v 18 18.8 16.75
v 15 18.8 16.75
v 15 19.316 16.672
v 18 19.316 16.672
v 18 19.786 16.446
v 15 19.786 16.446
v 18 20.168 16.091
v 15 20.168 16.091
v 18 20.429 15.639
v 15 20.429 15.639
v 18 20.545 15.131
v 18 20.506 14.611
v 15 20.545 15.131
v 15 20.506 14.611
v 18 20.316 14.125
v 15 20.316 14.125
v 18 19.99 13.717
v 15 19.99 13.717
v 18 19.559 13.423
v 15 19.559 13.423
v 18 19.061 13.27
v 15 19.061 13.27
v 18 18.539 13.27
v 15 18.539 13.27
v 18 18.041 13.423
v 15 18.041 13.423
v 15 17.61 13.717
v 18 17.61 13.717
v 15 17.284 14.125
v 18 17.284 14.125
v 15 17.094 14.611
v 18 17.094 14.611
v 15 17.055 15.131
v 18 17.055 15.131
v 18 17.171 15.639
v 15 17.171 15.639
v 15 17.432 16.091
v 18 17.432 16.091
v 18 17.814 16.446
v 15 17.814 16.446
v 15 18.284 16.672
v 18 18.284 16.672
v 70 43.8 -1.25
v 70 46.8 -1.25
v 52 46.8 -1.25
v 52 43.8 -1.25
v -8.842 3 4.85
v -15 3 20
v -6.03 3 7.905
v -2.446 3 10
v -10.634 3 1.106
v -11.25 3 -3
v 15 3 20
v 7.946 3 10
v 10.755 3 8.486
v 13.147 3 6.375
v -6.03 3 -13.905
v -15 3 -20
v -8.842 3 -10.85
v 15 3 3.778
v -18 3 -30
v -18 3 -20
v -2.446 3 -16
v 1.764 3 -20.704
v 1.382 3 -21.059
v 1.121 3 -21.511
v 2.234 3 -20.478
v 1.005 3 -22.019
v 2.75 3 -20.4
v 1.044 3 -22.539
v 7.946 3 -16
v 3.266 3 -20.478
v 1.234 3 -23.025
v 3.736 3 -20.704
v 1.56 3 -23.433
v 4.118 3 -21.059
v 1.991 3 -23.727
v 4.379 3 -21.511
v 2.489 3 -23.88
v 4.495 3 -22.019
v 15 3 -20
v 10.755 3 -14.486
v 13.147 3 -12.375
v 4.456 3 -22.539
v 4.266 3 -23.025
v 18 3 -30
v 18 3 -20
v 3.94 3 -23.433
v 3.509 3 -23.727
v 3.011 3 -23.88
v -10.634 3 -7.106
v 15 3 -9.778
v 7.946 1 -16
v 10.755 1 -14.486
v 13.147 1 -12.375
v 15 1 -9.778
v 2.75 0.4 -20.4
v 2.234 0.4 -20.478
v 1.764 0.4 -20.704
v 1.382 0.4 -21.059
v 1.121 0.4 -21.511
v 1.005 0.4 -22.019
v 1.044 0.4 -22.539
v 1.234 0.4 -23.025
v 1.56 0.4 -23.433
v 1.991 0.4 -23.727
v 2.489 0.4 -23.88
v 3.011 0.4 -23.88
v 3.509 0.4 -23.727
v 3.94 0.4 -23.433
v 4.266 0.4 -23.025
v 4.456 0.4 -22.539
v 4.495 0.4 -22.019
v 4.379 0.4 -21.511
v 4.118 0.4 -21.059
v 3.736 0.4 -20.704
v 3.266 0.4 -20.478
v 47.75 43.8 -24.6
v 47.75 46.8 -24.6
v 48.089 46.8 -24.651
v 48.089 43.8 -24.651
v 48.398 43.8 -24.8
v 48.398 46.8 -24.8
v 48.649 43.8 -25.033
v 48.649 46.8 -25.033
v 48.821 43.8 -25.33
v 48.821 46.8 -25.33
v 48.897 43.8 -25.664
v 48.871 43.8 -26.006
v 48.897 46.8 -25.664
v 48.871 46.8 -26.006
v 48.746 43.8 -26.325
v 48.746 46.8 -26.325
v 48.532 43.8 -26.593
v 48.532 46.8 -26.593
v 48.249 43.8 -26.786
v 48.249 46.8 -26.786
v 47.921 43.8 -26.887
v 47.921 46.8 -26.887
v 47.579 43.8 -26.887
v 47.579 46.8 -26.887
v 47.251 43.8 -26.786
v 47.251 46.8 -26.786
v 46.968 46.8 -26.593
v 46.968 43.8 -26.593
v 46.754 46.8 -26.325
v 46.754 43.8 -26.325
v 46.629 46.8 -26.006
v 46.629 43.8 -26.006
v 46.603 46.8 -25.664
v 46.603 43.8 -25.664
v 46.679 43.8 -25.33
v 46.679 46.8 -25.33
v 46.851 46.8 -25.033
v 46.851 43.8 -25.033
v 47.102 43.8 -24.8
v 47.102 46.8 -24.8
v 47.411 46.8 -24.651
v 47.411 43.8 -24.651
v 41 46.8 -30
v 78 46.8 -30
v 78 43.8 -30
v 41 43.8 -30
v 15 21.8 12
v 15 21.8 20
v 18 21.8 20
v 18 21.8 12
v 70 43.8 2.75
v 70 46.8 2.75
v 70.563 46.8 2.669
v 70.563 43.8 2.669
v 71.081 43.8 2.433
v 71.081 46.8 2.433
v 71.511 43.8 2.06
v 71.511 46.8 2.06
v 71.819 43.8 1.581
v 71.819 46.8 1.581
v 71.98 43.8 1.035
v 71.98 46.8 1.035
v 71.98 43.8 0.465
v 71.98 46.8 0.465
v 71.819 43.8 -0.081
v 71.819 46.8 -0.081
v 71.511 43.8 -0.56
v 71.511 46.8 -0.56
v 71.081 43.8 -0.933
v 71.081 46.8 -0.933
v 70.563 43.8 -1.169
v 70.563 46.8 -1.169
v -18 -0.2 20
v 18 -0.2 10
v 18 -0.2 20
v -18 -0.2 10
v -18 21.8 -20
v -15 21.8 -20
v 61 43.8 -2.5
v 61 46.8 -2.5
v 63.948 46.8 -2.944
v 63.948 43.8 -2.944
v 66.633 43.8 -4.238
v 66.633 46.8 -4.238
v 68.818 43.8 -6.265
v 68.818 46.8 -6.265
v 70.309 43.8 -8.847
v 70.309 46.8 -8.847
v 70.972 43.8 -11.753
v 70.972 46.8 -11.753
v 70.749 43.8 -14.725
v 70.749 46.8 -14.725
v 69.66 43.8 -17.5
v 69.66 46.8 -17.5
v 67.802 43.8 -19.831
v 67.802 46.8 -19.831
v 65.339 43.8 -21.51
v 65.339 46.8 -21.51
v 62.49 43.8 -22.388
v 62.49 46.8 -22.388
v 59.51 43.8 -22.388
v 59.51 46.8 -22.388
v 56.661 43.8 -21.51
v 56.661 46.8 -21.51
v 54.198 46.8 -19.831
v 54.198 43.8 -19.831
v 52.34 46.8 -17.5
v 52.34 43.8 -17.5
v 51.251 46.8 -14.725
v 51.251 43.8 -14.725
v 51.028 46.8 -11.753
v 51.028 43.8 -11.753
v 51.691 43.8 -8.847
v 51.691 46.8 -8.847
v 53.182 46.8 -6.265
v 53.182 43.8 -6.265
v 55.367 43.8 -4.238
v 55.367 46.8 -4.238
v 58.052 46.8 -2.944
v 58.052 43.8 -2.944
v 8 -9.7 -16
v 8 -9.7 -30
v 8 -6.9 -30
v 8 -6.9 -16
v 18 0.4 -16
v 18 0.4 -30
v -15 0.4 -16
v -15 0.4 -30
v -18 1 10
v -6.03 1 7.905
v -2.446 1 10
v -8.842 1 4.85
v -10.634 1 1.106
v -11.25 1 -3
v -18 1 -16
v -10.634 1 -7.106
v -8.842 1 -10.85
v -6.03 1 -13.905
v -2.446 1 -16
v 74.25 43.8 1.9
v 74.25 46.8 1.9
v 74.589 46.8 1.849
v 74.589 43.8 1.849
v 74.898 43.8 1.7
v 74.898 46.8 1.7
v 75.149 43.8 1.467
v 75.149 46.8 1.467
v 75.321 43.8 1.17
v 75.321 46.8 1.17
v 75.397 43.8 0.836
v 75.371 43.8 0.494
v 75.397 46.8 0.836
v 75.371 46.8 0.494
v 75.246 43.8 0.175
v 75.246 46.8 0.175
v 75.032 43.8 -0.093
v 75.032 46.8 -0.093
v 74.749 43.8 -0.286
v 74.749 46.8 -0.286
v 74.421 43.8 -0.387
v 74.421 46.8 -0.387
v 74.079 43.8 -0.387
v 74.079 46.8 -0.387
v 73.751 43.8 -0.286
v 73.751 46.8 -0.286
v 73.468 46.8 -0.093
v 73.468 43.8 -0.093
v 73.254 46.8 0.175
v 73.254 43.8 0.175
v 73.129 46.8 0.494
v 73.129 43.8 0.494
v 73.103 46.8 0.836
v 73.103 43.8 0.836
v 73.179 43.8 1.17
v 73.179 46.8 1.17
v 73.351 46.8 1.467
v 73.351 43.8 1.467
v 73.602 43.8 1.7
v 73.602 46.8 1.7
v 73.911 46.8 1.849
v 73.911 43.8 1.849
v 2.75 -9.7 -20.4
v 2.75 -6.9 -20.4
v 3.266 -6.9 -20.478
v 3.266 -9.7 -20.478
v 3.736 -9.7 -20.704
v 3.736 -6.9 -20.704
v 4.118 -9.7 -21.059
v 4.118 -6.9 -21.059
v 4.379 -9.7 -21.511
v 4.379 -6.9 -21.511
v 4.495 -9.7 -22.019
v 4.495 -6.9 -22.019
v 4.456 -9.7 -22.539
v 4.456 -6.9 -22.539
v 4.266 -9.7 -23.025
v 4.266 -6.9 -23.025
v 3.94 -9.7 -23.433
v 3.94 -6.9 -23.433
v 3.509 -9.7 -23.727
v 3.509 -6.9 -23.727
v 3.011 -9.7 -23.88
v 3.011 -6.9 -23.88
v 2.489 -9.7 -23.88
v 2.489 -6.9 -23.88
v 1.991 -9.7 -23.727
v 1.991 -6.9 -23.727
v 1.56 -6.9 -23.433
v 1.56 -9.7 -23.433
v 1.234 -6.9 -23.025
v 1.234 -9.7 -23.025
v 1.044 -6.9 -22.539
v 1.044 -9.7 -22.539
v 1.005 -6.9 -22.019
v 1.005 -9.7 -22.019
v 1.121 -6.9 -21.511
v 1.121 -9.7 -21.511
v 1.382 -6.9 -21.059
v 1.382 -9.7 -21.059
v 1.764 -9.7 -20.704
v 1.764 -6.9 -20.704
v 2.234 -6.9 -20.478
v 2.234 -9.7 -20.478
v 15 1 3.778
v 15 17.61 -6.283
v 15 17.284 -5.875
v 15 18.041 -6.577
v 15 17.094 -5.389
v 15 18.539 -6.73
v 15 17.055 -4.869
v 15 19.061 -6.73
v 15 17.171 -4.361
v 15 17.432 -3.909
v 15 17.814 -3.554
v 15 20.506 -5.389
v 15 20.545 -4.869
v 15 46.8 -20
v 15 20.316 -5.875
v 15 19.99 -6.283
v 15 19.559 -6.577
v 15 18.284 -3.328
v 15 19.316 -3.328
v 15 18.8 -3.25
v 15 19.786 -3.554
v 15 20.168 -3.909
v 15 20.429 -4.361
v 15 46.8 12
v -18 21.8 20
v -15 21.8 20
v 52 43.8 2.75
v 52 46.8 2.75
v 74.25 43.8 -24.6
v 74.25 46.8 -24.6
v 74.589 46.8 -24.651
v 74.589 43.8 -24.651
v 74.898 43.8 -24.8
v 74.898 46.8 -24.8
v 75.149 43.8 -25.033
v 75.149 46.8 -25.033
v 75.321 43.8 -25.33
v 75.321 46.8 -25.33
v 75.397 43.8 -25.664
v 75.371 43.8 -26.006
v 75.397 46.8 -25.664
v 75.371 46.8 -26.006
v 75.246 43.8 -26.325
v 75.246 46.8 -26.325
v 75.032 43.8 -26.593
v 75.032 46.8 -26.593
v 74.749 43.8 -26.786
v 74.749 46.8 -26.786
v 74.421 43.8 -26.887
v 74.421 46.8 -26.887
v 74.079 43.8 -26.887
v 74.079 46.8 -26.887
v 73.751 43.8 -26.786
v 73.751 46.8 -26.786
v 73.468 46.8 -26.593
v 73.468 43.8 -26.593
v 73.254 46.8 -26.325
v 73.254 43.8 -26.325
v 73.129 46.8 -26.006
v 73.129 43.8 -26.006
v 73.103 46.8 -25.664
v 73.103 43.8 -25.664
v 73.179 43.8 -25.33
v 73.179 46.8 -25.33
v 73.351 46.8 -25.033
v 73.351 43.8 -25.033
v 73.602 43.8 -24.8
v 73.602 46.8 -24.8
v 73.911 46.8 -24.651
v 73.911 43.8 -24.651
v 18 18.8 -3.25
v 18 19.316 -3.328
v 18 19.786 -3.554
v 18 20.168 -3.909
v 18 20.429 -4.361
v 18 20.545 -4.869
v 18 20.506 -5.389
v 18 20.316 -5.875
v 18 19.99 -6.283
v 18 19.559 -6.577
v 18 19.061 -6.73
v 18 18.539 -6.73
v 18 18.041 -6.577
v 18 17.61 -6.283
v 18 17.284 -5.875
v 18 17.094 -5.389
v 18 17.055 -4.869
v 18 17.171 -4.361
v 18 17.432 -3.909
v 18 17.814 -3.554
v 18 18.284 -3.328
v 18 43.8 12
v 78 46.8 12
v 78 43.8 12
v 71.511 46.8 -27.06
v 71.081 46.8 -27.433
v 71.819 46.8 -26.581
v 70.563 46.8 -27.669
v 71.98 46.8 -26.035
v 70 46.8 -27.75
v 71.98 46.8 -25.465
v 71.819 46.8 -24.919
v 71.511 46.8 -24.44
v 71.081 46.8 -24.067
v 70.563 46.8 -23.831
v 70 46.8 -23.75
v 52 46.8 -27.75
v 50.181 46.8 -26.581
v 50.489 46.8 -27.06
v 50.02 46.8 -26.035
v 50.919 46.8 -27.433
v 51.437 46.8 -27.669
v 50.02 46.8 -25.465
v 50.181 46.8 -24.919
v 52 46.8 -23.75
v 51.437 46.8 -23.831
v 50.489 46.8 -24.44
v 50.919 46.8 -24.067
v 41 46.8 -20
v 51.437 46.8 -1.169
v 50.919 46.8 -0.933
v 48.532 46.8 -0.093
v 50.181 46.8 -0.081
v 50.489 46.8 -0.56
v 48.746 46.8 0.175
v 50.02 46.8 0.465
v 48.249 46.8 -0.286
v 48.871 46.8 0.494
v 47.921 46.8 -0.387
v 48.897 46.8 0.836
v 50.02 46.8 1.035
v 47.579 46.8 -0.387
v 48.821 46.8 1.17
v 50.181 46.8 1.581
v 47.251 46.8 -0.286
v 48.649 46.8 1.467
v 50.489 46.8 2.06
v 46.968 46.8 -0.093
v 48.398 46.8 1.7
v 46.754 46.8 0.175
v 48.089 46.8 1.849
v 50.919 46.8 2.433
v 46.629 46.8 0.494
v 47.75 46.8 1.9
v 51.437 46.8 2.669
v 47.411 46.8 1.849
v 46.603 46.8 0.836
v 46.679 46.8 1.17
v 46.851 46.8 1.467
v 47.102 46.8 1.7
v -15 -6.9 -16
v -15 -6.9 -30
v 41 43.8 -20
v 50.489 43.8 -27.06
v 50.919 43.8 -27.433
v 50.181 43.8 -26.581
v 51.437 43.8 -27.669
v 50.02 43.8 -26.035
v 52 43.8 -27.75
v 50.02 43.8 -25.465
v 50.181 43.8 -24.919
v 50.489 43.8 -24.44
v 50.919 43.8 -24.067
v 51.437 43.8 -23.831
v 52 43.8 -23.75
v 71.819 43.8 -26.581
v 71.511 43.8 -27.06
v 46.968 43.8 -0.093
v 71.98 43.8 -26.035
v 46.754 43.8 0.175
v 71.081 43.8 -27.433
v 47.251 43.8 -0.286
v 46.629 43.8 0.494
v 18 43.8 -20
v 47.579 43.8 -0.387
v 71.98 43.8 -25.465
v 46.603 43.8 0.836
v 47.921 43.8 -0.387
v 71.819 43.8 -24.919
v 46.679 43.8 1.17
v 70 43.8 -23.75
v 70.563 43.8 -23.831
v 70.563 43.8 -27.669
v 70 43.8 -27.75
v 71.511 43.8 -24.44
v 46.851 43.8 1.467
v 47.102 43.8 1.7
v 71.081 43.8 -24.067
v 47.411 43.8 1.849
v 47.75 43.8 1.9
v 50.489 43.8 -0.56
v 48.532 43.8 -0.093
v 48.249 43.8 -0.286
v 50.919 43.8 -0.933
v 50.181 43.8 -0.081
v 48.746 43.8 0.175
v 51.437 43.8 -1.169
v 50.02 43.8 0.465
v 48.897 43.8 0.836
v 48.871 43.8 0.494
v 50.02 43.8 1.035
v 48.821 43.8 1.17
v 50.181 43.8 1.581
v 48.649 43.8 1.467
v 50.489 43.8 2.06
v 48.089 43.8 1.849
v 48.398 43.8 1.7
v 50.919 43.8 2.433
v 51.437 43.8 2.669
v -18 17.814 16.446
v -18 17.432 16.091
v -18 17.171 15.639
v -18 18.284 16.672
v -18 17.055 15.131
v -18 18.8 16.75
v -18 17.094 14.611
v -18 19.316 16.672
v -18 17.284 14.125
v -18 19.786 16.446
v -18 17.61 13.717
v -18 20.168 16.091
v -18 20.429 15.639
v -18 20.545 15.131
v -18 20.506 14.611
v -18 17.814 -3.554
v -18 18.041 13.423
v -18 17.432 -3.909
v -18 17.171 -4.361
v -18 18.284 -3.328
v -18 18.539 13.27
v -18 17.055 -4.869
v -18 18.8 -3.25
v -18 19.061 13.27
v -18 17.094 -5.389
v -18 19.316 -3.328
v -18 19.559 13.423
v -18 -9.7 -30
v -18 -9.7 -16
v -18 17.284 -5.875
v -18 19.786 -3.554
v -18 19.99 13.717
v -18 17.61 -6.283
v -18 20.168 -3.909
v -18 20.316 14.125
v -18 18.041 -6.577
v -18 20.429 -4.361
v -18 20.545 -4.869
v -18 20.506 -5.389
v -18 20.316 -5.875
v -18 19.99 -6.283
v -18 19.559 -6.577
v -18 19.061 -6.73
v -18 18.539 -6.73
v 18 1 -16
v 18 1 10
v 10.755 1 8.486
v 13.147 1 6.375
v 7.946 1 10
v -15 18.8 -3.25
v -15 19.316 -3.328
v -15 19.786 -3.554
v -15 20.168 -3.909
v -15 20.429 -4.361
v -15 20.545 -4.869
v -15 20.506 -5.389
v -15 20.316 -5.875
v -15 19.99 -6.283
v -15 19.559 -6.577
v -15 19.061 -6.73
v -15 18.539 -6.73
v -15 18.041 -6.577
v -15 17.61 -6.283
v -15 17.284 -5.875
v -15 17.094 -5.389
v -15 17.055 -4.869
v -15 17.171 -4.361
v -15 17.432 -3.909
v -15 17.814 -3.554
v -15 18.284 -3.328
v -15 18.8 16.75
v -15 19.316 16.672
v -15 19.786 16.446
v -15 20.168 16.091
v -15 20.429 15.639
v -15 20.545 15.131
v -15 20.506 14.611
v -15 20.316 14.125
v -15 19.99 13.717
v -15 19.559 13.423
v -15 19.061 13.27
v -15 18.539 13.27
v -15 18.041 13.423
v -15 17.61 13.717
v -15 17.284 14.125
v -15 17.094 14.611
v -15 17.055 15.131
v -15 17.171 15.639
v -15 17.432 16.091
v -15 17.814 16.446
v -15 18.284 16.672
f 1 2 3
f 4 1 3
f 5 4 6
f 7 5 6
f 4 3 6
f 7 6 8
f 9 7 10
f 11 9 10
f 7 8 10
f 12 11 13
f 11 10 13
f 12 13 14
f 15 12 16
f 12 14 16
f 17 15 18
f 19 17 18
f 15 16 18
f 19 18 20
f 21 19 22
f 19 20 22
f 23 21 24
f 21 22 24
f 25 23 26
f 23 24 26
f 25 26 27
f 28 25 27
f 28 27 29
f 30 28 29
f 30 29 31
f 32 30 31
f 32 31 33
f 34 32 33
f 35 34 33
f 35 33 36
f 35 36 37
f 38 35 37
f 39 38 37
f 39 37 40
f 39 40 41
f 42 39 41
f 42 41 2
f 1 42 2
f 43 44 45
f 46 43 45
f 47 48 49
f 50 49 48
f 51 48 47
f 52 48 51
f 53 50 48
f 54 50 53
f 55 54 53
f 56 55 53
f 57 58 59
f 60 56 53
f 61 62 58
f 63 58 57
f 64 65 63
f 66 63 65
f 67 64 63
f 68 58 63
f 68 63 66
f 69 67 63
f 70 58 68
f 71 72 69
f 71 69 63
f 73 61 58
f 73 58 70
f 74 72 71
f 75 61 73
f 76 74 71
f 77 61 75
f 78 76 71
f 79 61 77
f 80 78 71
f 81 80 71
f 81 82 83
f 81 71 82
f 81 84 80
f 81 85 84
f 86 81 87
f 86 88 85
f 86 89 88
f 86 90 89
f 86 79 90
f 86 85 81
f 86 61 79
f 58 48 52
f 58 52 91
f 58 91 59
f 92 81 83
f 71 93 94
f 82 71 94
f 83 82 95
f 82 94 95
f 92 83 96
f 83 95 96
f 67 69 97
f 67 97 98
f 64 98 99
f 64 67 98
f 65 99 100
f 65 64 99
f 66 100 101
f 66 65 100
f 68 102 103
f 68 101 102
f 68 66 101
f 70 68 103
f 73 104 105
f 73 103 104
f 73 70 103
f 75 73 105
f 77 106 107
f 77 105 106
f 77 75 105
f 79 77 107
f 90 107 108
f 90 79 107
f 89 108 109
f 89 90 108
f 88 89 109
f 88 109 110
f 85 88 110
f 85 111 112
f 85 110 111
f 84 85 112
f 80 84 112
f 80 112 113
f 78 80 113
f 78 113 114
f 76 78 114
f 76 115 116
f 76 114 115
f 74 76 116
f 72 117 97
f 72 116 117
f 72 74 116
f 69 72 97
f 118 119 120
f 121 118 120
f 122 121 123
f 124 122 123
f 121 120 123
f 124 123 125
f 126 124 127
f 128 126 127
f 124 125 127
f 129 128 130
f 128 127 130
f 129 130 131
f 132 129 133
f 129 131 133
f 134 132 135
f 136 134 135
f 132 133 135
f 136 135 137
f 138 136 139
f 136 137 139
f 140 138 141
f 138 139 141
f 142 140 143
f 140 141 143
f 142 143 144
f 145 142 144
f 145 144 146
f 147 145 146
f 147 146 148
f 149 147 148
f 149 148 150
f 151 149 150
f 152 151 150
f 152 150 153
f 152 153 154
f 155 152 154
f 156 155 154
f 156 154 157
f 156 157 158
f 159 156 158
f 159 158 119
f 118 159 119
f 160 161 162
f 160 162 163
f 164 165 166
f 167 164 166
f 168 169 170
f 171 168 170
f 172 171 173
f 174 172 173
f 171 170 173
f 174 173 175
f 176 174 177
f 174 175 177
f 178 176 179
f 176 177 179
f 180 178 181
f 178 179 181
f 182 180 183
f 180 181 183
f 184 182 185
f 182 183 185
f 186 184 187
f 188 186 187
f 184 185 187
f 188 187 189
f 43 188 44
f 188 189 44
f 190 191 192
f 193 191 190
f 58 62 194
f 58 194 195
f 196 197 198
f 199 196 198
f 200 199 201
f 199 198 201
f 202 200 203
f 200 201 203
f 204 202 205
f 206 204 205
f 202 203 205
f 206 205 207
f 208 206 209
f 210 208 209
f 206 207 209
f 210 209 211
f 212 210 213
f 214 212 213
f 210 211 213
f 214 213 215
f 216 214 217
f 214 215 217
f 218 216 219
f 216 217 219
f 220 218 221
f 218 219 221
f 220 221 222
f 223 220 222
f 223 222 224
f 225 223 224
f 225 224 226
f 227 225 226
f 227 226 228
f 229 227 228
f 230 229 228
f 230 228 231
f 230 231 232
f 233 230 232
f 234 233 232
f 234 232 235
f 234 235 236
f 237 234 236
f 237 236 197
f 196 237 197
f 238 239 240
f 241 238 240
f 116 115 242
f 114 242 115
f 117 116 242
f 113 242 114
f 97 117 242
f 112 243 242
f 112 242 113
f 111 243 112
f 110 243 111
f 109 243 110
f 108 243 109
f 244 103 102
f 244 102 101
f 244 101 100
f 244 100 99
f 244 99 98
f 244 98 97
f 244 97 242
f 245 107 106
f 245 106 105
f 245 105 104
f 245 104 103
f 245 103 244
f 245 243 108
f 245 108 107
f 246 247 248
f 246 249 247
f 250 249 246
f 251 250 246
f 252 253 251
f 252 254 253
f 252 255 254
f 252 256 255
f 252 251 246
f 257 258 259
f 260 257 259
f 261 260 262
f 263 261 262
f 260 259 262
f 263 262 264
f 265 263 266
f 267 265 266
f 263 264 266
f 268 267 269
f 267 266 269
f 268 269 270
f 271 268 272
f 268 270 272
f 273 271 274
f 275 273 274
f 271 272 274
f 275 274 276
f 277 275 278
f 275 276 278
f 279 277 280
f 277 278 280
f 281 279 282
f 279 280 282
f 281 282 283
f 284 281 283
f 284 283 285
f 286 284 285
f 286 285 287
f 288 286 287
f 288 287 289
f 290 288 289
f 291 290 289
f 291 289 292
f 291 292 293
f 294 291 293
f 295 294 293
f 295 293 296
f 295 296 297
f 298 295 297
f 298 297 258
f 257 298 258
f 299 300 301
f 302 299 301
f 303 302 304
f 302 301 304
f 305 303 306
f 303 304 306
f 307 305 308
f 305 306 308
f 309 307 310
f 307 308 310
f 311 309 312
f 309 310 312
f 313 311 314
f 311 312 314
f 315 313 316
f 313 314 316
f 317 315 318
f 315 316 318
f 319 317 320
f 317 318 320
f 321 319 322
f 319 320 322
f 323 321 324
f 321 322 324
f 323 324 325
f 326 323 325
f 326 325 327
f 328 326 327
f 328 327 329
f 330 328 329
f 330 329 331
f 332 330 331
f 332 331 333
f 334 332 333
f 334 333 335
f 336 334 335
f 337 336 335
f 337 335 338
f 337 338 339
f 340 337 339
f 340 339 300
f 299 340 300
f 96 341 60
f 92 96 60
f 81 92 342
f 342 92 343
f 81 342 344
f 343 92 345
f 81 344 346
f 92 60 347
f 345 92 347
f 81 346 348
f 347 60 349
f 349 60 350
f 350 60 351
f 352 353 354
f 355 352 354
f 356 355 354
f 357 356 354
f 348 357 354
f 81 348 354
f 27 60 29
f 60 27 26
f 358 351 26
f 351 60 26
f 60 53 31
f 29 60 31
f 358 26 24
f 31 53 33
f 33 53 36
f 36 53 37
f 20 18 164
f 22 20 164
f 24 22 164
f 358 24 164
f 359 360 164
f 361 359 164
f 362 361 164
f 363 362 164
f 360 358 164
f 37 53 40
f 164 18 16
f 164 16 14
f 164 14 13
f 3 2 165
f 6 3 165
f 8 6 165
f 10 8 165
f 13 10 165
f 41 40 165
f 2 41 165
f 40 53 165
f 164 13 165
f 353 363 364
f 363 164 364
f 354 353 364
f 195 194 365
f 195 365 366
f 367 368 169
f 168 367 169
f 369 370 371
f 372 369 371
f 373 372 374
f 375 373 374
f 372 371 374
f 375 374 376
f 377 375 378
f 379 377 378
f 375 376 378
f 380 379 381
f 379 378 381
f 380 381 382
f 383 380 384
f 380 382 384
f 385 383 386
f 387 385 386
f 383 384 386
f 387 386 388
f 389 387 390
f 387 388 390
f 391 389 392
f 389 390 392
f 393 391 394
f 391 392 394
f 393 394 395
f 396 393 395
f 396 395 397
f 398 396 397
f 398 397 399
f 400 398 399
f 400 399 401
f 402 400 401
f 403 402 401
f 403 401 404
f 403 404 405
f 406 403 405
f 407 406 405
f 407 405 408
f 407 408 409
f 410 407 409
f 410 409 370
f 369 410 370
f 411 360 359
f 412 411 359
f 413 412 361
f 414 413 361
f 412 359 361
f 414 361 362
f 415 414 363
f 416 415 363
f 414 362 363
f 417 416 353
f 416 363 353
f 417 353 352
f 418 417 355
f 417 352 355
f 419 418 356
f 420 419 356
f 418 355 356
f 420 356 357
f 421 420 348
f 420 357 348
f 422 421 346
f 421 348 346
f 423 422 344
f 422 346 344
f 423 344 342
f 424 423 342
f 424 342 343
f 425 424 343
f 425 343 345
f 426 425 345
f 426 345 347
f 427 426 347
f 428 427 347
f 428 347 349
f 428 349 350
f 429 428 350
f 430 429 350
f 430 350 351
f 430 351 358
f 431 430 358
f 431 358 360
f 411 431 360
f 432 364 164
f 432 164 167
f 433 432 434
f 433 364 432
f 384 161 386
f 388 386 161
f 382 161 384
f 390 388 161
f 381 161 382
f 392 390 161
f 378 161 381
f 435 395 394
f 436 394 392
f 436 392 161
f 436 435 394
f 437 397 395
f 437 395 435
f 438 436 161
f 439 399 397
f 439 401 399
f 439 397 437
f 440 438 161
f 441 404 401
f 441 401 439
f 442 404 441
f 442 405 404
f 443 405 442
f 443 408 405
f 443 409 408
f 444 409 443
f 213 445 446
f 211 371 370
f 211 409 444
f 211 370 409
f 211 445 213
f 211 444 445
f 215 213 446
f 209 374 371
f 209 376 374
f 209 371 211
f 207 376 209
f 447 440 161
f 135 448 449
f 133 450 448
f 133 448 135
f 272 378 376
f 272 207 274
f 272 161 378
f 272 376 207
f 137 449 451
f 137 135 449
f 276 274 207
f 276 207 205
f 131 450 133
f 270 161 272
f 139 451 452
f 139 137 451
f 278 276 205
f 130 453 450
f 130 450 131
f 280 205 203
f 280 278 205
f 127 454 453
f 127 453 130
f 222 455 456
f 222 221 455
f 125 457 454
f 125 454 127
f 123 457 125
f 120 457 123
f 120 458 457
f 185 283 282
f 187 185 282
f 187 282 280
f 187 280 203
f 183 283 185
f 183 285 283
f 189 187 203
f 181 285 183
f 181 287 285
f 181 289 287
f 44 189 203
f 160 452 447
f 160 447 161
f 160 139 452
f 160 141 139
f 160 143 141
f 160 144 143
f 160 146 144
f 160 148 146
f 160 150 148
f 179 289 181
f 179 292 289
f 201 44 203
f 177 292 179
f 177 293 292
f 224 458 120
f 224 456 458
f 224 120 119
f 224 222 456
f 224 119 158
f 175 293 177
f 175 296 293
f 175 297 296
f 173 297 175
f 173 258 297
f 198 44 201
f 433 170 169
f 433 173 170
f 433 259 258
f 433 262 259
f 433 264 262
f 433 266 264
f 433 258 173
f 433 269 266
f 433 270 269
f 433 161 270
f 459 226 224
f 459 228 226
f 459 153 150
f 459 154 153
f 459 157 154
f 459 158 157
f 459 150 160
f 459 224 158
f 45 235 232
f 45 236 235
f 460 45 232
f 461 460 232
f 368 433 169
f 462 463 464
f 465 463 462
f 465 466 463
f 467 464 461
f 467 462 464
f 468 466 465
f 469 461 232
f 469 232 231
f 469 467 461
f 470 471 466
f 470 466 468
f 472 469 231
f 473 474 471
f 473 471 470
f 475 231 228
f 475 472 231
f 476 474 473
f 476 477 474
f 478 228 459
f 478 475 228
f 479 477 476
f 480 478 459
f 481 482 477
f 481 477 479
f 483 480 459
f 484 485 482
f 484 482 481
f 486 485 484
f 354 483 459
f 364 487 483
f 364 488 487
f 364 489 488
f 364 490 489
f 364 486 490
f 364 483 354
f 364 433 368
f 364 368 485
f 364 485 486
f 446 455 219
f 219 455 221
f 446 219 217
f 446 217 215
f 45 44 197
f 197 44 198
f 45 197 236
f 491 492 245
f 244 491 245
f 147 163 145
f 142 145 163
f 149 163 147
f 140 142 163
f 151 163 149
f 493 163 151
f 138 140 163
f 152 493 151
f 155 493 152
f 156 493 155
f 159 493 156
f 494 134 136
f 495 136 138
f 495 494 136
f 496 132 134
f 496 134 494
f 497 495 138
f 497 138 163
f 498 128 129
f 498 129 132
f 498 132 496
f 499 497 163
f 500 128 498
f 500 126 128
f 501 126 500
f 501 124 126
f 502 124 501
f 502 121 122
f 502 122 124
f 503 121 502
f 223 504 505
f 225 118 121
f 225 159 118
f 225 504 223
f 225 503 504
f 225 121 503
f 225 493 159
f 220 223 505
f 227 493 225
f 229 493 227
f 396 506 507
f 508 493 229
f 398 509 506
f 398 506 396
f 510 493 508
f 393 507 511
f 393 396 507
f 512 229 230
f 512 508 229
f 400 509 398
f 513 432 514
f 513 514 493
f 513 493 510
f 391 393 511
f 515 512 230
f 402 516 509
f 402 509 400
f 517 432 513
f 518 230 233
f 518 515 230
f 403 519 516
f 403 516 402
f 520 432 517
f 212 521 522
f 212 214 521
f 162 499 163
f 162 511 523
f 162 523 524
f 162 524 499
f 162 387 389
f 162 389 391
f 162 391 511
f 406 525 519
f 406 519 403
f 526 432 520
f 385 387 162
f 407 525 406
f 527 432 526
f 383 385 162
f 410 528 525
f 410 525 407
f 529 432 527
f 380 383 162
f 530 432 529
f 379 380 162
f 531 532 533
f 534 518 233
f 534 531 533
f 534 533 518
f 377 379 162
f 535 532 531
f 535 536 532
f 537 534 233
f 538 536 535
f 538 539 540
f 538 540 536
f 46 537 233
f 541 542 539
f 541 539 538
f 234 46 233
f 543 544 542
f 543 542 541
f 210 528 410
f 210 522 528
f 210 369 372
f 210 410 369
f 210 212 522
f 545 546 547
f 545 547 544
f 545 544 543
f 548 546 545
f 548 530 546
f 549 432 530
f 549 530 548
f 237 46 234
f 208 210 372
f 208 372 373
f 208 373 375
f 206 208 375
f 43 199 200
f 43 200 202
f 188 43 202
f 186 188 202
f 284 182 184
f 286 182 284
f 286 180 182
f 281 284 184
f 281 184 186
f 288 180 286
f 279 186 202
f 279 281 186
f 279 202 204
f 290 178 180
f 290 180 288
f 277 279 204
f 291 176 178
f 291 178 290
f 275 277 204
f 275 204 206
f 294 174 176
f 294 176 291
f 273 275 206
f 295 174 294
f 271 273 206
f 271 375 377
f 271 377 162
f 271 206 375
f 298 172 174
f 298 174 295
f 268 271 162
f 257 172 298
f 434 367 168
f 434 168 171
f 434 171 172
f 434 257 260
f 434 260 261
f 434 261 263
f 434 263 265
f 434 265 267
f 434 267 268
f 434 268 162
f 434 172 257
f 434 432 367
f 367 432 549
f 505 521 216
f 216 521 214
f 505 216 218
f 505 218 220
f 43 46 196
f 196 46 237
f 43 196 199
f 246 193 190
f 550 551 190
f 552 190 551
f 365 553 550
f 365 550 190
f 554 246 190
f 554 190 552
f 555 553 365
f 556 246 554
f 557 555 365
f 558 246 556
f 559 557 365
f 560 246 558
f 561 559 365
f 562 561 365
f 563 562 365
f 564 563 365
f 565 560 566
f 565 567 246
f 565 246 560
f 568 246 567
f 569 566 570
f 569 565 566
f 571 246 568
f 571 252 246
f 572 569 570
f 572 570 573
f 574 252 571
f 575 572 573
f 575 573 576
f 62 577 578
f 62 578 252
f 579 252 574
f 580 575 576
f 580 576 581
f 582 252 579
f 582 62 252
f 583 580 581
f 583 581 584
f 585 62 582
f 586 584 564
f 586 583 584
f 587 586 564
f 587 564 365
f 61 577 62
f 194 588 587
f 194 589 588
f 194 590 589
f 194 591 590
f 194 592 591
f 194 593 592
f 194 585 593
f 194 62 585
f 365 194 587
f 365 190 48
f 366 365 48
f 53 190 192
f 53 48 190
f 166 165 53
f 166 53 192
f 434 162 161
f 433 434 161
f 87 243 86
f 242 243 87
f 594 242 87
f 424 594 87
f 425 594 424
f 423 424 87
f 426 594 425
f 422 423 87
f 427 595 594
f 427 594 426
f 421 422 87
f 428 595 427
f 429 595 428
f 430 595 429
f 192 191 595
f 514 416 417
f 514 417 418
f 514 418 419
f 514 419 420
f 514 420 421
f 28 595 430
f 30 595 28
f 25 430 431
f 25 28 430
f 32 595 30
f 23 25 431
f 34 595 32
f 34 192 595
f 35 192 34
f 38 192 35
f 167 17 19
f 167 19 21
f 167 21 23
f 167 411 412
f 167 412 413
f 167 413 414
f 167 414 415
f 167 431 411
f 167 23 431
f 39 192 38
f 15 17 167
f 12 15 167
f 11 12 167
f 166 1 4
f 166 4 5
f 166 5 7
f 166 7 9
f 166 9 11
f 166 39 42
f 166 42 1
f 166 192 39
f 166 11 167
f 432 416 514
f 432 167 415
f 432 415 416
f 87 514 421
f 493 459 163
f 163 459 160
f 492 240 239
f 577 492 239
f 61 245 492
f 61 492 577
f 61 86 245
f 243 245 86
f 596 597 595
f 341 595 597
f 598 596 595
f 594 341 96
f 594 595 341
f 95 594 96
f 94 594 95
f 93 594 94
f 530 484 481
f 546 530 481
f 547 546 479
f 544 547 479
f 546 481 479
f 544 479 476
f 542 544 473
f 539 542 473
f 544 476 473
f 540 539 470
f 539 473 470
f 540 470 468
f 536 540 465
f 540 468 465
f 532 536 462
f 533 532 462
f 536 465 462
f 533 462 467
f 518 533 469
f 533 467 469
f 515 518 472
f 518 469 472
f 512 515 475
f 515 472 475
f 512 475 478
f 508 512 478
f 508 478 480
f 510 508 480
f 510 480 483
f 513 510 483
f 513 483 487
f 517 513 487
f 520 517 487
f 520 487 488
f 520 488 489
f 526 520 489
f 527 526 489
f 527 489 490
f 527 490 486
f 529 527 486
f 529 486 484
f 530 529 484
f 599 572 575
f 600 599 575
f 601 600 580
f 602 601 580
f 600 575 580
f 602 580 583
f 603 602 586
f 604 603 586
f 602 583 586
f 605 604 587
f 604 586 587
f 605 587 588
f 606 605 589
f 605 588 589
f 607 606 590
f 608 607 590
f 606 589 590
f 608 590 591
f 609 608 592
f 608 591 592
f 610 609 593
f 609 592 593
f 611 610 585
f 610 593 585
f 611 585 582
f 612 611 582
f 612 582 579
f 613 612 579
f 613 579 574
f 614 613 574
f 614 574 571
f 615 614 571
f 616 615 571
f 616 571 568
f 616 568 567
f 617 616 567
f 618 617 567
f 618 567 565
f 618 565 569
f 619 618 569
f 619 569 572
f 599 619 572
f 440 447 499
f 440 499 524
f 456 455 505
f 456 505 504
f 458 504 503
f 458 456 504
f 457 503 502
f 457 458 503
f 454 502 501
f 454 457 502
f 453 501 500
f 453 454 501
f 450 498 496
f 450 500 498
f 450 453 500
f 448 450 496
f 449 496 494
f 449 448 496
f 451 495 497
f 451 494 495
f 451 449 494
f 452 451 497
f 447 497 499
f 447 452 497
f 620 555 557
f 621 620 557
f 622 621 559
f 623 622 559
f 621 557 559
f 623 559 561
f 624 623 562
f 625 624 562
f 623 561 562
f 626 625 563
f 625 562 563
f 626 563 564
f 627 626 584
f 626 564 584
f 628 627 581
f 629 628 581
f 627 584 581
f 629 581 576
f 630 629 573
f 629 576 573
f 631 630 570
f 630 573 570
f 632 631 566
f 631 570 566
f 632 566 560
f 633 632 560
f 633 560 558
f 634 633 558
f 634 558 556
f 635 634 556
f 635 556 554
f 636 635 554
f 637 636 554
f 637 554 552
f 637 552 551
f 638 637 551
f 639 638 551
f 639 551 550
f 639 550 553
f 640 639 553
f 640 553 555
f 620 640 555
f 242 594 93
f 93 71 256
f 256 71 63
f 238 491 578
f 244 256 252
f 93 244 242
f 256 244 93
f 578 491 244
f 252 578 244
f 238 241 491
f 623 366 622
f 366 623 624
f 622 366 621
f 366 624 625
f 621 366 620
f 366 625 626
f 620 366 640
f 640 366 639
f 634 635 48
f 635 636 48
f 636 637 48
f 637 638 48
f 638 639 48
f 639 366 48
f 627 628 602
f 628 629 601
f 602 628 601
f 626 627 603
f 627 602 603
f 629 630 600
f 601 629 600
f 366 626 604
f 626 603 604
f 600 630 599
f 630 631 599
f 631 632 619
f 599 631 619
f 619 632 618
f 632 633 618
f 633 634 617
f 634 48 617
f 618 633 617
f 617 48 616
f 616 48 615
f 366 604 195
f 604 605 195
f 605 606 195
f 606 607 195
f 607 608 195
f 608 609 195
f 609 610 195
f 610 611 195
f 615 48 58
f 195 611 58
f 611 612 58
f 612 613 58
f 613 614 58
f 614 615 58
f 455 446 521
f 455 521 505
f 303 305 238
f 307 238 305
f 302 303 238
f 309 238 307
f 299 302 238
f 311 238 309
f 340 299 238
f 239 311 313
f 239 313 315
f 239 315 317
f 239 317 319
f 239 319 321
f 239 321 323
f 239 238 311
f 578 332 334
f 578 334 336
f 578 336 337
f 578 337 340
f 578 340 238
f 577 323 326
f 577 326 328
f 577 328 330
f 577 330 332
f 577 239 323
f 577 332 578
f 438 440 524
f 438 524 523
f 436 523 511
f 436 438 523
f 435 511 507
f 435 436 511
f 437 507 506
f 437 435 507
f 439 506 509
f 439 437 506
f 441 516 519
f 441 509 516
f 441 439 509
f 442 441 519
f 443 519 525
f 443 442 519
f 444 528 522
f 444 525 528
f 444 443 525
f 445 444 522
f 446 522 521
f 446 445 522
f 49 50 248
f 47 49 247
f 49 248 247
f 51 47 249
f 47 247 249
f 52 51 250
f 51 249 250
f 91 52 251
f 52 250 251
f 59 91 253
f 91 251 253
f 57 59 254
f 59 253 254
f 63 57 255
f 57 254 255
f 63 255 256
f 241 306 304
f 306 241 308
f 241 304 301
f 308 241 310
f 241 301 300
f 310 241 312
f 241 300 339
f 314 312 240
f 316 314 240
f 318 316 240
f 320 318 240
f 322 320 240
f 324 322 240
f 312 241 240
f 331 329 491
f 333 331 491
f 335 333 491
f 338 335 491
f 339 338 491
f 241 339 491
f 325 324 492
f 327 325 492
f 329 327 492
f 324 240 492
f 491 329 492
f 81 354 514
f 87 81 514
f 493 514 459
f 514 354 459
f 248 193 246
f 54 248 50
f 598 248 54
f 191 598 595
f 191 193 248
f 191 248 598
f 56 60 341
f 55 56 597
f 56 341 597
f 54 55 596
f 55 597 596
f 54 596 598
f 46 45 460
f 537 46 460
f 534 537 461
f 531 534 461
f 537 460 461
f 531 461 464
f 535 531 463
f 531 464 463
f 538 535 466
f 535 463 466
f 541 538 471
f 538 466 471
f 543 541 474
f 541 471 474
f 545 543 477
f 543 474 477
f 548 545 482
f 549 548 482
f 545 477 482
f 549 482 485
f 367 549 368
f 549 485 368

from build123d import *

# Parameters (mm, degrees)
SKETCH_1_W            = 36
SKETCH_1_H            = 40
EXTRUDE_1_DEPTH       = 3
SKETCH_2_W            = 3
SKETCH_2_H            = 40
EXTRUDE_2_DEPTH       = 18.8
SKETCH_3_R            = 14
CUT_EXTRUDE_1_DEPTH   = 9
SKETCH_4_W            = 36
SKETCH_4_H            = 3
EXTRUDE_3_DEPTH       = 10
SKETCH_6_R            = 2.7
CUT_EXTRUDE_3_DEPTH   = 10
SKETCH_7_R            = 1.75
CUT_EXTRUDE_4_DEPTH   = 52.68404009
SKETCH_9_W            = 25
SKETCH_9_H            = 3
SKETCH_9_W_2          = 3
SKETCH_9_H_2          = 9.3
EXTRUDE_4_DEPTH       = 20
CHAMFER_1_SIZE        = 5
CUT_EXTRUDE_START     = -30
SKETCH_10_R           = 2.7
CUT_EXTRUDE_5_DEPTH   = 30
SKETCH_11_W           = 40.05397725
SKETCH_11_H           = 18.071111192
CUT_EXTRUDE_6_DEPTH   = 52.68404009
EXTRUDE_START         = 2.5
SKETCH_12_W           = 36
SKETCH_12_H           = 20
SKETCH_12_R           = 2.7
EXTRUDE_5_DEPTH       = 2.5
SKETCH_13_W           = 62.12277329
SKETCH_13_H           = 35.561448302
CUT_EXTRUDE_7_DEPTH   = 1
SKETCH_16_W           = 60
SKETCH_16_H           = 3
SKETCH_16_W_2         = 3
SKETCH_16_H_2         = 25
EXTRUDE_7_DEPTH       = 65
EXTRUDE_START_2       = 8
EXTRUDE_8_DEPTH       = 8
SKETCH_18_R           = 1.15
SKETCH_18_R_2         = 10
CUT_EXTRUDE_8_DEPTH   = 15
SKETCH_19_W           = 125.229267156
SKETCH_19_H           = 103.922898786
CUT_EXTRUDE_9_DEPTH   = 0.5
SKETCH_20_W           = 154.797288569
SKETCH_20_H           = 90.443359613
CUT_EXTRUDE_10_DEPTH  = 1.8
SKETCH_21_W           = 11.155684717
SKETCH_21_H           = 2.603751016
EXTRUDE_9_DEPTH       = 3
EXTRUDE_10_DEPTH      = 10
EXTRUDE_10_DEPTH_BACK = 4
SKETCH_22_W           = 36
SKETCH_22_H           = 3.2
SKETCH_23_R           = 1.75
CUT_EXTRUDE_12_DEPTH  = 10
SKETCH_26_W           = 12.845915964
SKETCH_26_H           = 7.377373426
EXTRUDE_11_DEPTH      = 3.2
SKETCH_27_W           = 116.42408431
SKETCH_27_H           = 62.505927617
CUT_EXTRUDE_13_DEPTH  = 10
SKETCH_29_W           = 89.791123847
SKETCH_29_H           = 12.28472202
SKETCH_29_W_2         = 107.401489541
SKETCH_29_H_2         = 29.785433334
CUT_EXTRUDE_14_DEPTH  = 25
SKETCH_30_W           = 3
SKETCH_30_H           = 18.8
EXTRUDE_12_DEPTH      = 17
SKETCH_31_W           = 80.768529078
SKETCH_31_H           = 45.765209612
CUT_EXTRUDE_15_DEPTH  = 0.6
SKETCH_32_W           = 23
SKETCH_32_H           = 2.8
SKETCH_32_W_2         = 3
SKETCH_32_H_2         = 9.9
EXTRUDE_13_DEPTH      = 14
SKETCH_34_R           = 1.75
CUT_EXTRUDE_17_DEPTH  = 97.806198149
SKETCH_35_W           = 168.711651586
SKETCH_35_H           = 128.925269833
CUT_EXTRUDE_18_DEPTH  = 7
SKETCH_36_W           = 30.780953922
SKETCH_36_H           = 20.383466973
CUT_EXTRUDE_19_DEPTH  = 43.8


with BuildPart() as part:
    # 草图1 → 凸台-拉伸1 (new body)
    with BuildSketch(Plane(origin=(0, 0, 0), x_dir=(1, 0, 0), z_dir=(0, 1, 0))):
        Rectangle(SKETCH_1_W, SKETCH_1_H)
    extrude(amount=EXTRUDE_1_DEPTH)

    # 草图2 → 凸台-拉伸2 (add)
    with BuildSketch(Plane(origin=(0, 3, 0), x_dir=(1, 0, 0), z_dir=(0, 1, 0))):
        with Locations((-16.5, 0)):
            Rectangle(SKETCH_2_W, SKETCH_2_H)
        with Locations((16.5, 0)):
            Rectangle(SKETCH_2_W, SKETCH_2_H)
    extrude(amount=EXTRUDE_2_DEPTH)

    # 草图3 → 切除-拉伸1 (cut)
    with BuildSketch(Plane(origin=(0, 0, 0), x_dir=(-1, 0, 0), z_dir=(0, -1, 0))):
        with Locations(Location((-2.75, 3.000025, 0), (0, 0, 90))):
            Circle(SKETCH_3_R)
    extrude(amount=-CUT_EXTRUDE_1_DEPTH, mode=Mode.SUBTRACT)

    # 草图4 → 凸台-拉伸3 (add)
    with BuildSketch(Plane.XY.offset(20)):
        with Locations((0, 1.5)):
            Rectangle(SKETCH_4_W, SKETCH_4_H)
    extrude(amount=EXTRUDE_3_DEPTH)

    # 草图6 → 切除-拉伸3 (cut)
    with BuildSketch(Plane(origin=(0, 0, 0), x_dir=(-1, 0, 0), z_dir=(0, -1, 0))):
        with Locations(Location((-2.75, -16.149975, 0), (0, 0, 90))):
            Circle(SKETCH_6_R)
    extrude(amount=-CUT_EXTRUDE_3_DEPTH, mode=Mode.SUBTRACT)

    # 草图7 → 切除-拉伸4 (cut, through all)
    with BuildSketch(Plane.ZY.offset(18)):
        with Locations((15, 18.8)):
            Circle(SKETCH_7_R)
        with Locations((-5, 18.8)):
            Circle(SKETCH_7_R)
    extrude(amount=-CUT_EXTRUDE_4_DEPTH, mode=Mode.SUBTRACT)

    # 草图9 → 凸台-拉伸4 (add)
    with BuildSketch(Plane.XY.offset(30)):
        with Locations((-2.5, -7.8)):
            Rectangle(SKETCH_9_W, SKETCH_9_H)
        with Locations((-16.5, -4.65)):
            Rectangle(SKETCH_9_W_2, SKETCH_9_H_2)
    extrude(amount=-EXTRUDE_4_DEPTH)

    # 倒角1
    chamfer_1_edges = [part.edges().sort_by_distance(p)[0] for p in [
        (10, -7.8, 30),
    ]]
    chamfer(chamfer_1_edges, length=CHAMFER_1_SIZE)

    # 草图10 → 切除-拉伸5 (cut)
    with BuildSketch(Plane(origin=(0, 0, 0), x_dir=(1, 0, 0), z_dir=(0, 1, 0)).offset(CUT_EXTRUDE_START)):
        with Locations(Location((2.75, -16.149975, 0), (0, 0, 90))):
            Circle(SKETCH_10_R)
    extrude(amount=CUT_EXTRUDE_5_DEPTH, mode=Mode.SUBTRACT)

    # 草图11 → 切除-拉伸6 (cut, through all)
    with BuildSketch(Plane.ZY.offset(18)):
        with Locations((20.026988625, -9.035555596)):
            Rectangle(SKETCH_11_W, SKETCH_11_H)
    extrude(amount=-CUT_EXTRUDE_6_DEPTH, mode=Mode.SUBTRACT)

    # 草图12 → 凸台-拉伸5 (add)
    with BuildSketch(Plane(origin=(0, 0, 0), x_dir=(-1, 0, 0), z_dir=(0, -1, 0)).offset(EXTRUDE_START)):
        with Locations((0, -20)):
            Rectangle(SKETCH_12_W, SKETCH_12_H)
        with Locations(Location((-2.75, -16.149975, 0), (0, 0, 90))):
            Circle(SKETCH_12_R, mode=Mode.SUBTRACT)
    extrude(amount=-EXTRUDE_5_DEPTH)

    # 草图13 → 切除-拉伸7 (cut)
    with BuildSketch(Plane(origin=(0, 0, 0), x_dir=(-1, 0, 0), z_dir=(0, -1, 0))):
        with Locations((0.086945799, 7.780724151)):
            Rectangle(SKETCH_13_W, SKETCH_13_H)
    extrude(amount=-CUT_EXTRUDE_7_DEPTH, mode=Mode.SUBTRACT)

    # 草图16 → 凸台-拉伸7 (add)
    with BuildSketch(Plane.XY.offset(20)):
        with Locations((48, 45.3)):
            Rectangle(SKETCH_16_W, SKETCH_16_H)
        with Locations((16.5, 34.3)):
            Rectangle(SKETCH_16_W_2, SKETCH_16_H_2)
    extrude(amount=-EXTRUDE_7_DEPTH)

    # 草图17 → 凸台-拉伸8 (add)
    with BuildSketch(Plane(origin=(0, 9, 0), x_dir=(-1, 0, 0), z_dir=(0, -1, 0)).offset(EXTRUDE_START_2)):
        with BuildLine():
            Line((-15, -3.777695856), (-15, 9.777745856))
            ThreePointArc((-15, 9.777745856), (-16.75, 3.000025), (-15, -3.777695856))
        make_face()
    extrude(amount=-EXTRUDE_8_DEPTH)

    # 草图18 → 切除-拉伸8 (cut)
    with BuildSketch(Plane(origin=(0, 46.8, 0), x_dir=(1, 0, 0), z_dir=(0, 1, 0))):
        with Locations(Location((47.75, 25.75, 0), (0, 0, 270))):
            Circle(SKETCH_18_R)
        with Locations(Location((74.25, 25.75, 0), (0, 0, 270))):
            Circle(SKETCH_18_R)
        with Locations(Location((74.25, -0.75, 0), (0, 0, 270))):
            Circle(SKETCH_18_R)
        with Locations(Location((47.75, -0.75, 0), (0, 0, 270))):
            Circle(SKETCH_18_R)
        with Locations(Location((61, 12.5, 0), (0, 0, 270))):
            Circle(SKETCH_18_R_2)
        with BuildLine():
            Line((52, 27.75), (70, 27.75))
            ThreePointArc((70, 27.75), (72, 25.75), (70, 23.75))
            Line((70, 23.75), (52, 23.75))
            ThreePointArc((52, 23.75), (50, 25.75), (52, 27.75))
        make_face()
        with BuildLine():
            Line((52, -2.75), (70, -2.75))
            ThreePointArc((70, -2.75), (72, -0.75), (70, 1.25))
            Line((70, 1.25), (52, 1.25))
            ThreePointArc((52, 1.25), (50, -0.75), (52, -2.75))
        make_face()
    extrude(amount=-CUT_EXTRUDE_8_DEPTH, mode=Mode.SUBTRACT)

    # 草图19 → 切除-拉伸9 (cut)
    with BuildSketch(Plane(origin=(0, -2.5, 0), x_dir=(-1, 0, 0), z_dir=(0, -1, 0))):
        with Locations((5.272239112, -16.1971882)):
            Rectangle(SKETCH_19_W, SKETCH_19_H)
    extrude(amount=-CUT_EXTRUDE_9_DEPTH, mode=Mode.SUBTRACT)

    # 草图20 → 切除-拉伸10 (cut)
    with BuildSketch(Plane(origin=(0, -2, 0), x_dir=(-1, 0, 0), z_dir=(0, -1, 0))):
        with Locations((2.880707968, -7.718123237)):
            Rectangle(SKETCH_20_W, SKETCH_20_H)
    extrude(amount=-CUT_EXTRUDE_10_DEPTH, mode=Mode.SUBTRACT)

    # 草图21 → 凸台-拉伸9 (add)
    with BuildSketch(Plane(origin=(0, 0, 0), x_dir=(1, 0, 0), z_dir=(0, 1, 0))):
        with Locations((3.131752483, -11.301875508)):
            Rectangle(SKETCH_21_W, SKETCH_21_H)
    extrude(amount=EXTRUDE_9_DEPTH)

    # 草图22 → 凸台-拉伸10 (add, two sides: drawn at the far end of the back side and taken through both)
    with BuildSketch(Plane(origin=(0, 0, -20), x_dir=(-1, 0, 0), z_dir=(0, 0, -1)).offset(-EXTRUDE_10_DEPTH_BACK)):
        with Locations((0, 1.4)):
            Rectangle(SKETCH_22_W, SKETCH_22_H)
    extrude(amount=EXTRUDE_10_DEPTH + EXTRUDE_10_DEPTH_BACK)

    # 草图23 → 切除-拉伸12 (cut)
    with BuildSketch(Plane(origin=(0, 9, 0), x_dir=(-1, 0, 0), z_dir=(0, -1, 0))):
        with Locations(Location((-2.75, 22.150025, 0), (0, 0, 270))):
            Circle(SKETCH_23_R)
    extrude(amount=CUT_EXTRUDE_12_DEPTH, mode=Mode.SUBTRACT)

    # 草图26 → 凸台-拉伸11 (add, through all)
    with BuildSketch(Plane(origin=(0, 3, 0), x_dir=(1, 0, 0), z_dir=(0, 1, 0))):
        with Locations((3.420651678, -16.929062366)):
            Rectangle(SKETCH_26_W, SKETCH_26_H)
    extrude(amount=-EXTRUDE_11_DEPTH)

    # 草图27 → 切除-拉伸13 (cut)
    with BuildSketch(Plane.XY.offset(30)):
        with Locations((4.783062287, -2.648783639)):
            Rectangle(SKETCH_27_W, SKETCH_27_H)
    extrude(amount=-CUT_EXTRUDE_13_DEPTH, mode=Mode.SUBTRACT)

    # 草图29 → 切除-拉伸14 (cut)
    with BuildSketch(Plane(origin=(0, 46.8, 0), x_dir=(1, 0, 0), z_dir=(0, 1, 0))):
        with Locations((43.319325488, 43.14236101)):
            Rectangle(SKETCH_29_W, SKETCH_29_H)
        with Locations((56.472746777, -26.892716667)):
            Rectangle(SKETCH_29_W_2, SKETCH_29_H_2)
    extrude(amount=-CUT_EXTRUDE_14_DEPTH, mode=Mode.SUBTRACT)

    # 草图30 → 凸台-拉伸12 (add)
    with BuildSketch(Plane(origin=(0, 0, -20), x_dir=(-1, 0, 0), z_dir=(0, 0, -1))):
        with Locations((-16.5, 12.4)):
            Rectangle(SKETCH_30_W, SKETCH_30_H)
    extrude(amount=EXTRUDE_12_DEPTH)

    # 草图31 → 切除-拉伸15 (cut)
    with BuildSketch(Plane(origin=(0, -0.2, 0), x_dir=(-1, 0, 0), z_dir=(0, -1, 0))):
        with Locations((-3.369884793, 29.731080354)):
            Rectangle(SKETCH_31_W, SKETCH_31_H)
    extrude(amount=-CUT_EXTRUDE_15_DEPTH, mode=Mode.SUBTRACT)

    # 草图32 → 凸台-拉伸13 (add)
    with BuildSketch(Plane(origin=(0, 0, -30), x_dir=(-1, 0, 0), z_dir=(0, 0, -1))):
        with Locations((3.5, -8.3)):
            Rectangle(SKETCH_32_W, SKETCH_32_H)
        with Locations((16.5, -1.95)):
            Rectangle(SKETCH_32_W_2, SKETCH_32_H_2)
        with Locations((16.5, -8.3)):
            Rectangle(SKETCH_32_W_2, SKETCH_32_H)
    extrude(amount=-EXTRUDE_13_DEPTH)

    # 草图34 → 切除-拉伸17 (cut, through all)
    with BuildSketch(Plane(origin=(0, 3, 0), x_dir=(1, 0, 0), z_dir=(0, 1, 0))):
        with Locations(Location((2.75, 22.150025, 0), (0, 0, 270))):
            Circle(SKETCH_34_R)
    extrude(amount=-CUT_EXTRUDE_17_DEPTH, mode=Mode.SUBTRACT)

    # 草图35 → 切除-拉伸18 (cut)
    with BuildSketch(Plane(origin=(0, 0, -37), x_dir=(-1, 0, 0), z_dir=(0, 0, -1))):
        with Locations((-14.403539842, 2.608943066)):
            Rectangle(SKETCH_35_W, SKETCH_35_H)
    extrude(amount=-CUT_EXTRUDE_18_DEPTH, mode=Mode.SUBTRACT)

    # 草图36 → 切除-拉伸19 (cut)
    with BuildSketch(Plane(origin=(0, 46.8, 0), x_dir=(1, 0, 0), z_dir=(0, 1, 0))):
        with Locations((25.609523039, 30.191733487)):
            Rectangle(SKETCH_36_W, SKETCH_36_H)
    extrude(amount=-CUT_EXTRUDE_19_DEPTH, mode=Mode.SUBTRACT)


solid = part.part
